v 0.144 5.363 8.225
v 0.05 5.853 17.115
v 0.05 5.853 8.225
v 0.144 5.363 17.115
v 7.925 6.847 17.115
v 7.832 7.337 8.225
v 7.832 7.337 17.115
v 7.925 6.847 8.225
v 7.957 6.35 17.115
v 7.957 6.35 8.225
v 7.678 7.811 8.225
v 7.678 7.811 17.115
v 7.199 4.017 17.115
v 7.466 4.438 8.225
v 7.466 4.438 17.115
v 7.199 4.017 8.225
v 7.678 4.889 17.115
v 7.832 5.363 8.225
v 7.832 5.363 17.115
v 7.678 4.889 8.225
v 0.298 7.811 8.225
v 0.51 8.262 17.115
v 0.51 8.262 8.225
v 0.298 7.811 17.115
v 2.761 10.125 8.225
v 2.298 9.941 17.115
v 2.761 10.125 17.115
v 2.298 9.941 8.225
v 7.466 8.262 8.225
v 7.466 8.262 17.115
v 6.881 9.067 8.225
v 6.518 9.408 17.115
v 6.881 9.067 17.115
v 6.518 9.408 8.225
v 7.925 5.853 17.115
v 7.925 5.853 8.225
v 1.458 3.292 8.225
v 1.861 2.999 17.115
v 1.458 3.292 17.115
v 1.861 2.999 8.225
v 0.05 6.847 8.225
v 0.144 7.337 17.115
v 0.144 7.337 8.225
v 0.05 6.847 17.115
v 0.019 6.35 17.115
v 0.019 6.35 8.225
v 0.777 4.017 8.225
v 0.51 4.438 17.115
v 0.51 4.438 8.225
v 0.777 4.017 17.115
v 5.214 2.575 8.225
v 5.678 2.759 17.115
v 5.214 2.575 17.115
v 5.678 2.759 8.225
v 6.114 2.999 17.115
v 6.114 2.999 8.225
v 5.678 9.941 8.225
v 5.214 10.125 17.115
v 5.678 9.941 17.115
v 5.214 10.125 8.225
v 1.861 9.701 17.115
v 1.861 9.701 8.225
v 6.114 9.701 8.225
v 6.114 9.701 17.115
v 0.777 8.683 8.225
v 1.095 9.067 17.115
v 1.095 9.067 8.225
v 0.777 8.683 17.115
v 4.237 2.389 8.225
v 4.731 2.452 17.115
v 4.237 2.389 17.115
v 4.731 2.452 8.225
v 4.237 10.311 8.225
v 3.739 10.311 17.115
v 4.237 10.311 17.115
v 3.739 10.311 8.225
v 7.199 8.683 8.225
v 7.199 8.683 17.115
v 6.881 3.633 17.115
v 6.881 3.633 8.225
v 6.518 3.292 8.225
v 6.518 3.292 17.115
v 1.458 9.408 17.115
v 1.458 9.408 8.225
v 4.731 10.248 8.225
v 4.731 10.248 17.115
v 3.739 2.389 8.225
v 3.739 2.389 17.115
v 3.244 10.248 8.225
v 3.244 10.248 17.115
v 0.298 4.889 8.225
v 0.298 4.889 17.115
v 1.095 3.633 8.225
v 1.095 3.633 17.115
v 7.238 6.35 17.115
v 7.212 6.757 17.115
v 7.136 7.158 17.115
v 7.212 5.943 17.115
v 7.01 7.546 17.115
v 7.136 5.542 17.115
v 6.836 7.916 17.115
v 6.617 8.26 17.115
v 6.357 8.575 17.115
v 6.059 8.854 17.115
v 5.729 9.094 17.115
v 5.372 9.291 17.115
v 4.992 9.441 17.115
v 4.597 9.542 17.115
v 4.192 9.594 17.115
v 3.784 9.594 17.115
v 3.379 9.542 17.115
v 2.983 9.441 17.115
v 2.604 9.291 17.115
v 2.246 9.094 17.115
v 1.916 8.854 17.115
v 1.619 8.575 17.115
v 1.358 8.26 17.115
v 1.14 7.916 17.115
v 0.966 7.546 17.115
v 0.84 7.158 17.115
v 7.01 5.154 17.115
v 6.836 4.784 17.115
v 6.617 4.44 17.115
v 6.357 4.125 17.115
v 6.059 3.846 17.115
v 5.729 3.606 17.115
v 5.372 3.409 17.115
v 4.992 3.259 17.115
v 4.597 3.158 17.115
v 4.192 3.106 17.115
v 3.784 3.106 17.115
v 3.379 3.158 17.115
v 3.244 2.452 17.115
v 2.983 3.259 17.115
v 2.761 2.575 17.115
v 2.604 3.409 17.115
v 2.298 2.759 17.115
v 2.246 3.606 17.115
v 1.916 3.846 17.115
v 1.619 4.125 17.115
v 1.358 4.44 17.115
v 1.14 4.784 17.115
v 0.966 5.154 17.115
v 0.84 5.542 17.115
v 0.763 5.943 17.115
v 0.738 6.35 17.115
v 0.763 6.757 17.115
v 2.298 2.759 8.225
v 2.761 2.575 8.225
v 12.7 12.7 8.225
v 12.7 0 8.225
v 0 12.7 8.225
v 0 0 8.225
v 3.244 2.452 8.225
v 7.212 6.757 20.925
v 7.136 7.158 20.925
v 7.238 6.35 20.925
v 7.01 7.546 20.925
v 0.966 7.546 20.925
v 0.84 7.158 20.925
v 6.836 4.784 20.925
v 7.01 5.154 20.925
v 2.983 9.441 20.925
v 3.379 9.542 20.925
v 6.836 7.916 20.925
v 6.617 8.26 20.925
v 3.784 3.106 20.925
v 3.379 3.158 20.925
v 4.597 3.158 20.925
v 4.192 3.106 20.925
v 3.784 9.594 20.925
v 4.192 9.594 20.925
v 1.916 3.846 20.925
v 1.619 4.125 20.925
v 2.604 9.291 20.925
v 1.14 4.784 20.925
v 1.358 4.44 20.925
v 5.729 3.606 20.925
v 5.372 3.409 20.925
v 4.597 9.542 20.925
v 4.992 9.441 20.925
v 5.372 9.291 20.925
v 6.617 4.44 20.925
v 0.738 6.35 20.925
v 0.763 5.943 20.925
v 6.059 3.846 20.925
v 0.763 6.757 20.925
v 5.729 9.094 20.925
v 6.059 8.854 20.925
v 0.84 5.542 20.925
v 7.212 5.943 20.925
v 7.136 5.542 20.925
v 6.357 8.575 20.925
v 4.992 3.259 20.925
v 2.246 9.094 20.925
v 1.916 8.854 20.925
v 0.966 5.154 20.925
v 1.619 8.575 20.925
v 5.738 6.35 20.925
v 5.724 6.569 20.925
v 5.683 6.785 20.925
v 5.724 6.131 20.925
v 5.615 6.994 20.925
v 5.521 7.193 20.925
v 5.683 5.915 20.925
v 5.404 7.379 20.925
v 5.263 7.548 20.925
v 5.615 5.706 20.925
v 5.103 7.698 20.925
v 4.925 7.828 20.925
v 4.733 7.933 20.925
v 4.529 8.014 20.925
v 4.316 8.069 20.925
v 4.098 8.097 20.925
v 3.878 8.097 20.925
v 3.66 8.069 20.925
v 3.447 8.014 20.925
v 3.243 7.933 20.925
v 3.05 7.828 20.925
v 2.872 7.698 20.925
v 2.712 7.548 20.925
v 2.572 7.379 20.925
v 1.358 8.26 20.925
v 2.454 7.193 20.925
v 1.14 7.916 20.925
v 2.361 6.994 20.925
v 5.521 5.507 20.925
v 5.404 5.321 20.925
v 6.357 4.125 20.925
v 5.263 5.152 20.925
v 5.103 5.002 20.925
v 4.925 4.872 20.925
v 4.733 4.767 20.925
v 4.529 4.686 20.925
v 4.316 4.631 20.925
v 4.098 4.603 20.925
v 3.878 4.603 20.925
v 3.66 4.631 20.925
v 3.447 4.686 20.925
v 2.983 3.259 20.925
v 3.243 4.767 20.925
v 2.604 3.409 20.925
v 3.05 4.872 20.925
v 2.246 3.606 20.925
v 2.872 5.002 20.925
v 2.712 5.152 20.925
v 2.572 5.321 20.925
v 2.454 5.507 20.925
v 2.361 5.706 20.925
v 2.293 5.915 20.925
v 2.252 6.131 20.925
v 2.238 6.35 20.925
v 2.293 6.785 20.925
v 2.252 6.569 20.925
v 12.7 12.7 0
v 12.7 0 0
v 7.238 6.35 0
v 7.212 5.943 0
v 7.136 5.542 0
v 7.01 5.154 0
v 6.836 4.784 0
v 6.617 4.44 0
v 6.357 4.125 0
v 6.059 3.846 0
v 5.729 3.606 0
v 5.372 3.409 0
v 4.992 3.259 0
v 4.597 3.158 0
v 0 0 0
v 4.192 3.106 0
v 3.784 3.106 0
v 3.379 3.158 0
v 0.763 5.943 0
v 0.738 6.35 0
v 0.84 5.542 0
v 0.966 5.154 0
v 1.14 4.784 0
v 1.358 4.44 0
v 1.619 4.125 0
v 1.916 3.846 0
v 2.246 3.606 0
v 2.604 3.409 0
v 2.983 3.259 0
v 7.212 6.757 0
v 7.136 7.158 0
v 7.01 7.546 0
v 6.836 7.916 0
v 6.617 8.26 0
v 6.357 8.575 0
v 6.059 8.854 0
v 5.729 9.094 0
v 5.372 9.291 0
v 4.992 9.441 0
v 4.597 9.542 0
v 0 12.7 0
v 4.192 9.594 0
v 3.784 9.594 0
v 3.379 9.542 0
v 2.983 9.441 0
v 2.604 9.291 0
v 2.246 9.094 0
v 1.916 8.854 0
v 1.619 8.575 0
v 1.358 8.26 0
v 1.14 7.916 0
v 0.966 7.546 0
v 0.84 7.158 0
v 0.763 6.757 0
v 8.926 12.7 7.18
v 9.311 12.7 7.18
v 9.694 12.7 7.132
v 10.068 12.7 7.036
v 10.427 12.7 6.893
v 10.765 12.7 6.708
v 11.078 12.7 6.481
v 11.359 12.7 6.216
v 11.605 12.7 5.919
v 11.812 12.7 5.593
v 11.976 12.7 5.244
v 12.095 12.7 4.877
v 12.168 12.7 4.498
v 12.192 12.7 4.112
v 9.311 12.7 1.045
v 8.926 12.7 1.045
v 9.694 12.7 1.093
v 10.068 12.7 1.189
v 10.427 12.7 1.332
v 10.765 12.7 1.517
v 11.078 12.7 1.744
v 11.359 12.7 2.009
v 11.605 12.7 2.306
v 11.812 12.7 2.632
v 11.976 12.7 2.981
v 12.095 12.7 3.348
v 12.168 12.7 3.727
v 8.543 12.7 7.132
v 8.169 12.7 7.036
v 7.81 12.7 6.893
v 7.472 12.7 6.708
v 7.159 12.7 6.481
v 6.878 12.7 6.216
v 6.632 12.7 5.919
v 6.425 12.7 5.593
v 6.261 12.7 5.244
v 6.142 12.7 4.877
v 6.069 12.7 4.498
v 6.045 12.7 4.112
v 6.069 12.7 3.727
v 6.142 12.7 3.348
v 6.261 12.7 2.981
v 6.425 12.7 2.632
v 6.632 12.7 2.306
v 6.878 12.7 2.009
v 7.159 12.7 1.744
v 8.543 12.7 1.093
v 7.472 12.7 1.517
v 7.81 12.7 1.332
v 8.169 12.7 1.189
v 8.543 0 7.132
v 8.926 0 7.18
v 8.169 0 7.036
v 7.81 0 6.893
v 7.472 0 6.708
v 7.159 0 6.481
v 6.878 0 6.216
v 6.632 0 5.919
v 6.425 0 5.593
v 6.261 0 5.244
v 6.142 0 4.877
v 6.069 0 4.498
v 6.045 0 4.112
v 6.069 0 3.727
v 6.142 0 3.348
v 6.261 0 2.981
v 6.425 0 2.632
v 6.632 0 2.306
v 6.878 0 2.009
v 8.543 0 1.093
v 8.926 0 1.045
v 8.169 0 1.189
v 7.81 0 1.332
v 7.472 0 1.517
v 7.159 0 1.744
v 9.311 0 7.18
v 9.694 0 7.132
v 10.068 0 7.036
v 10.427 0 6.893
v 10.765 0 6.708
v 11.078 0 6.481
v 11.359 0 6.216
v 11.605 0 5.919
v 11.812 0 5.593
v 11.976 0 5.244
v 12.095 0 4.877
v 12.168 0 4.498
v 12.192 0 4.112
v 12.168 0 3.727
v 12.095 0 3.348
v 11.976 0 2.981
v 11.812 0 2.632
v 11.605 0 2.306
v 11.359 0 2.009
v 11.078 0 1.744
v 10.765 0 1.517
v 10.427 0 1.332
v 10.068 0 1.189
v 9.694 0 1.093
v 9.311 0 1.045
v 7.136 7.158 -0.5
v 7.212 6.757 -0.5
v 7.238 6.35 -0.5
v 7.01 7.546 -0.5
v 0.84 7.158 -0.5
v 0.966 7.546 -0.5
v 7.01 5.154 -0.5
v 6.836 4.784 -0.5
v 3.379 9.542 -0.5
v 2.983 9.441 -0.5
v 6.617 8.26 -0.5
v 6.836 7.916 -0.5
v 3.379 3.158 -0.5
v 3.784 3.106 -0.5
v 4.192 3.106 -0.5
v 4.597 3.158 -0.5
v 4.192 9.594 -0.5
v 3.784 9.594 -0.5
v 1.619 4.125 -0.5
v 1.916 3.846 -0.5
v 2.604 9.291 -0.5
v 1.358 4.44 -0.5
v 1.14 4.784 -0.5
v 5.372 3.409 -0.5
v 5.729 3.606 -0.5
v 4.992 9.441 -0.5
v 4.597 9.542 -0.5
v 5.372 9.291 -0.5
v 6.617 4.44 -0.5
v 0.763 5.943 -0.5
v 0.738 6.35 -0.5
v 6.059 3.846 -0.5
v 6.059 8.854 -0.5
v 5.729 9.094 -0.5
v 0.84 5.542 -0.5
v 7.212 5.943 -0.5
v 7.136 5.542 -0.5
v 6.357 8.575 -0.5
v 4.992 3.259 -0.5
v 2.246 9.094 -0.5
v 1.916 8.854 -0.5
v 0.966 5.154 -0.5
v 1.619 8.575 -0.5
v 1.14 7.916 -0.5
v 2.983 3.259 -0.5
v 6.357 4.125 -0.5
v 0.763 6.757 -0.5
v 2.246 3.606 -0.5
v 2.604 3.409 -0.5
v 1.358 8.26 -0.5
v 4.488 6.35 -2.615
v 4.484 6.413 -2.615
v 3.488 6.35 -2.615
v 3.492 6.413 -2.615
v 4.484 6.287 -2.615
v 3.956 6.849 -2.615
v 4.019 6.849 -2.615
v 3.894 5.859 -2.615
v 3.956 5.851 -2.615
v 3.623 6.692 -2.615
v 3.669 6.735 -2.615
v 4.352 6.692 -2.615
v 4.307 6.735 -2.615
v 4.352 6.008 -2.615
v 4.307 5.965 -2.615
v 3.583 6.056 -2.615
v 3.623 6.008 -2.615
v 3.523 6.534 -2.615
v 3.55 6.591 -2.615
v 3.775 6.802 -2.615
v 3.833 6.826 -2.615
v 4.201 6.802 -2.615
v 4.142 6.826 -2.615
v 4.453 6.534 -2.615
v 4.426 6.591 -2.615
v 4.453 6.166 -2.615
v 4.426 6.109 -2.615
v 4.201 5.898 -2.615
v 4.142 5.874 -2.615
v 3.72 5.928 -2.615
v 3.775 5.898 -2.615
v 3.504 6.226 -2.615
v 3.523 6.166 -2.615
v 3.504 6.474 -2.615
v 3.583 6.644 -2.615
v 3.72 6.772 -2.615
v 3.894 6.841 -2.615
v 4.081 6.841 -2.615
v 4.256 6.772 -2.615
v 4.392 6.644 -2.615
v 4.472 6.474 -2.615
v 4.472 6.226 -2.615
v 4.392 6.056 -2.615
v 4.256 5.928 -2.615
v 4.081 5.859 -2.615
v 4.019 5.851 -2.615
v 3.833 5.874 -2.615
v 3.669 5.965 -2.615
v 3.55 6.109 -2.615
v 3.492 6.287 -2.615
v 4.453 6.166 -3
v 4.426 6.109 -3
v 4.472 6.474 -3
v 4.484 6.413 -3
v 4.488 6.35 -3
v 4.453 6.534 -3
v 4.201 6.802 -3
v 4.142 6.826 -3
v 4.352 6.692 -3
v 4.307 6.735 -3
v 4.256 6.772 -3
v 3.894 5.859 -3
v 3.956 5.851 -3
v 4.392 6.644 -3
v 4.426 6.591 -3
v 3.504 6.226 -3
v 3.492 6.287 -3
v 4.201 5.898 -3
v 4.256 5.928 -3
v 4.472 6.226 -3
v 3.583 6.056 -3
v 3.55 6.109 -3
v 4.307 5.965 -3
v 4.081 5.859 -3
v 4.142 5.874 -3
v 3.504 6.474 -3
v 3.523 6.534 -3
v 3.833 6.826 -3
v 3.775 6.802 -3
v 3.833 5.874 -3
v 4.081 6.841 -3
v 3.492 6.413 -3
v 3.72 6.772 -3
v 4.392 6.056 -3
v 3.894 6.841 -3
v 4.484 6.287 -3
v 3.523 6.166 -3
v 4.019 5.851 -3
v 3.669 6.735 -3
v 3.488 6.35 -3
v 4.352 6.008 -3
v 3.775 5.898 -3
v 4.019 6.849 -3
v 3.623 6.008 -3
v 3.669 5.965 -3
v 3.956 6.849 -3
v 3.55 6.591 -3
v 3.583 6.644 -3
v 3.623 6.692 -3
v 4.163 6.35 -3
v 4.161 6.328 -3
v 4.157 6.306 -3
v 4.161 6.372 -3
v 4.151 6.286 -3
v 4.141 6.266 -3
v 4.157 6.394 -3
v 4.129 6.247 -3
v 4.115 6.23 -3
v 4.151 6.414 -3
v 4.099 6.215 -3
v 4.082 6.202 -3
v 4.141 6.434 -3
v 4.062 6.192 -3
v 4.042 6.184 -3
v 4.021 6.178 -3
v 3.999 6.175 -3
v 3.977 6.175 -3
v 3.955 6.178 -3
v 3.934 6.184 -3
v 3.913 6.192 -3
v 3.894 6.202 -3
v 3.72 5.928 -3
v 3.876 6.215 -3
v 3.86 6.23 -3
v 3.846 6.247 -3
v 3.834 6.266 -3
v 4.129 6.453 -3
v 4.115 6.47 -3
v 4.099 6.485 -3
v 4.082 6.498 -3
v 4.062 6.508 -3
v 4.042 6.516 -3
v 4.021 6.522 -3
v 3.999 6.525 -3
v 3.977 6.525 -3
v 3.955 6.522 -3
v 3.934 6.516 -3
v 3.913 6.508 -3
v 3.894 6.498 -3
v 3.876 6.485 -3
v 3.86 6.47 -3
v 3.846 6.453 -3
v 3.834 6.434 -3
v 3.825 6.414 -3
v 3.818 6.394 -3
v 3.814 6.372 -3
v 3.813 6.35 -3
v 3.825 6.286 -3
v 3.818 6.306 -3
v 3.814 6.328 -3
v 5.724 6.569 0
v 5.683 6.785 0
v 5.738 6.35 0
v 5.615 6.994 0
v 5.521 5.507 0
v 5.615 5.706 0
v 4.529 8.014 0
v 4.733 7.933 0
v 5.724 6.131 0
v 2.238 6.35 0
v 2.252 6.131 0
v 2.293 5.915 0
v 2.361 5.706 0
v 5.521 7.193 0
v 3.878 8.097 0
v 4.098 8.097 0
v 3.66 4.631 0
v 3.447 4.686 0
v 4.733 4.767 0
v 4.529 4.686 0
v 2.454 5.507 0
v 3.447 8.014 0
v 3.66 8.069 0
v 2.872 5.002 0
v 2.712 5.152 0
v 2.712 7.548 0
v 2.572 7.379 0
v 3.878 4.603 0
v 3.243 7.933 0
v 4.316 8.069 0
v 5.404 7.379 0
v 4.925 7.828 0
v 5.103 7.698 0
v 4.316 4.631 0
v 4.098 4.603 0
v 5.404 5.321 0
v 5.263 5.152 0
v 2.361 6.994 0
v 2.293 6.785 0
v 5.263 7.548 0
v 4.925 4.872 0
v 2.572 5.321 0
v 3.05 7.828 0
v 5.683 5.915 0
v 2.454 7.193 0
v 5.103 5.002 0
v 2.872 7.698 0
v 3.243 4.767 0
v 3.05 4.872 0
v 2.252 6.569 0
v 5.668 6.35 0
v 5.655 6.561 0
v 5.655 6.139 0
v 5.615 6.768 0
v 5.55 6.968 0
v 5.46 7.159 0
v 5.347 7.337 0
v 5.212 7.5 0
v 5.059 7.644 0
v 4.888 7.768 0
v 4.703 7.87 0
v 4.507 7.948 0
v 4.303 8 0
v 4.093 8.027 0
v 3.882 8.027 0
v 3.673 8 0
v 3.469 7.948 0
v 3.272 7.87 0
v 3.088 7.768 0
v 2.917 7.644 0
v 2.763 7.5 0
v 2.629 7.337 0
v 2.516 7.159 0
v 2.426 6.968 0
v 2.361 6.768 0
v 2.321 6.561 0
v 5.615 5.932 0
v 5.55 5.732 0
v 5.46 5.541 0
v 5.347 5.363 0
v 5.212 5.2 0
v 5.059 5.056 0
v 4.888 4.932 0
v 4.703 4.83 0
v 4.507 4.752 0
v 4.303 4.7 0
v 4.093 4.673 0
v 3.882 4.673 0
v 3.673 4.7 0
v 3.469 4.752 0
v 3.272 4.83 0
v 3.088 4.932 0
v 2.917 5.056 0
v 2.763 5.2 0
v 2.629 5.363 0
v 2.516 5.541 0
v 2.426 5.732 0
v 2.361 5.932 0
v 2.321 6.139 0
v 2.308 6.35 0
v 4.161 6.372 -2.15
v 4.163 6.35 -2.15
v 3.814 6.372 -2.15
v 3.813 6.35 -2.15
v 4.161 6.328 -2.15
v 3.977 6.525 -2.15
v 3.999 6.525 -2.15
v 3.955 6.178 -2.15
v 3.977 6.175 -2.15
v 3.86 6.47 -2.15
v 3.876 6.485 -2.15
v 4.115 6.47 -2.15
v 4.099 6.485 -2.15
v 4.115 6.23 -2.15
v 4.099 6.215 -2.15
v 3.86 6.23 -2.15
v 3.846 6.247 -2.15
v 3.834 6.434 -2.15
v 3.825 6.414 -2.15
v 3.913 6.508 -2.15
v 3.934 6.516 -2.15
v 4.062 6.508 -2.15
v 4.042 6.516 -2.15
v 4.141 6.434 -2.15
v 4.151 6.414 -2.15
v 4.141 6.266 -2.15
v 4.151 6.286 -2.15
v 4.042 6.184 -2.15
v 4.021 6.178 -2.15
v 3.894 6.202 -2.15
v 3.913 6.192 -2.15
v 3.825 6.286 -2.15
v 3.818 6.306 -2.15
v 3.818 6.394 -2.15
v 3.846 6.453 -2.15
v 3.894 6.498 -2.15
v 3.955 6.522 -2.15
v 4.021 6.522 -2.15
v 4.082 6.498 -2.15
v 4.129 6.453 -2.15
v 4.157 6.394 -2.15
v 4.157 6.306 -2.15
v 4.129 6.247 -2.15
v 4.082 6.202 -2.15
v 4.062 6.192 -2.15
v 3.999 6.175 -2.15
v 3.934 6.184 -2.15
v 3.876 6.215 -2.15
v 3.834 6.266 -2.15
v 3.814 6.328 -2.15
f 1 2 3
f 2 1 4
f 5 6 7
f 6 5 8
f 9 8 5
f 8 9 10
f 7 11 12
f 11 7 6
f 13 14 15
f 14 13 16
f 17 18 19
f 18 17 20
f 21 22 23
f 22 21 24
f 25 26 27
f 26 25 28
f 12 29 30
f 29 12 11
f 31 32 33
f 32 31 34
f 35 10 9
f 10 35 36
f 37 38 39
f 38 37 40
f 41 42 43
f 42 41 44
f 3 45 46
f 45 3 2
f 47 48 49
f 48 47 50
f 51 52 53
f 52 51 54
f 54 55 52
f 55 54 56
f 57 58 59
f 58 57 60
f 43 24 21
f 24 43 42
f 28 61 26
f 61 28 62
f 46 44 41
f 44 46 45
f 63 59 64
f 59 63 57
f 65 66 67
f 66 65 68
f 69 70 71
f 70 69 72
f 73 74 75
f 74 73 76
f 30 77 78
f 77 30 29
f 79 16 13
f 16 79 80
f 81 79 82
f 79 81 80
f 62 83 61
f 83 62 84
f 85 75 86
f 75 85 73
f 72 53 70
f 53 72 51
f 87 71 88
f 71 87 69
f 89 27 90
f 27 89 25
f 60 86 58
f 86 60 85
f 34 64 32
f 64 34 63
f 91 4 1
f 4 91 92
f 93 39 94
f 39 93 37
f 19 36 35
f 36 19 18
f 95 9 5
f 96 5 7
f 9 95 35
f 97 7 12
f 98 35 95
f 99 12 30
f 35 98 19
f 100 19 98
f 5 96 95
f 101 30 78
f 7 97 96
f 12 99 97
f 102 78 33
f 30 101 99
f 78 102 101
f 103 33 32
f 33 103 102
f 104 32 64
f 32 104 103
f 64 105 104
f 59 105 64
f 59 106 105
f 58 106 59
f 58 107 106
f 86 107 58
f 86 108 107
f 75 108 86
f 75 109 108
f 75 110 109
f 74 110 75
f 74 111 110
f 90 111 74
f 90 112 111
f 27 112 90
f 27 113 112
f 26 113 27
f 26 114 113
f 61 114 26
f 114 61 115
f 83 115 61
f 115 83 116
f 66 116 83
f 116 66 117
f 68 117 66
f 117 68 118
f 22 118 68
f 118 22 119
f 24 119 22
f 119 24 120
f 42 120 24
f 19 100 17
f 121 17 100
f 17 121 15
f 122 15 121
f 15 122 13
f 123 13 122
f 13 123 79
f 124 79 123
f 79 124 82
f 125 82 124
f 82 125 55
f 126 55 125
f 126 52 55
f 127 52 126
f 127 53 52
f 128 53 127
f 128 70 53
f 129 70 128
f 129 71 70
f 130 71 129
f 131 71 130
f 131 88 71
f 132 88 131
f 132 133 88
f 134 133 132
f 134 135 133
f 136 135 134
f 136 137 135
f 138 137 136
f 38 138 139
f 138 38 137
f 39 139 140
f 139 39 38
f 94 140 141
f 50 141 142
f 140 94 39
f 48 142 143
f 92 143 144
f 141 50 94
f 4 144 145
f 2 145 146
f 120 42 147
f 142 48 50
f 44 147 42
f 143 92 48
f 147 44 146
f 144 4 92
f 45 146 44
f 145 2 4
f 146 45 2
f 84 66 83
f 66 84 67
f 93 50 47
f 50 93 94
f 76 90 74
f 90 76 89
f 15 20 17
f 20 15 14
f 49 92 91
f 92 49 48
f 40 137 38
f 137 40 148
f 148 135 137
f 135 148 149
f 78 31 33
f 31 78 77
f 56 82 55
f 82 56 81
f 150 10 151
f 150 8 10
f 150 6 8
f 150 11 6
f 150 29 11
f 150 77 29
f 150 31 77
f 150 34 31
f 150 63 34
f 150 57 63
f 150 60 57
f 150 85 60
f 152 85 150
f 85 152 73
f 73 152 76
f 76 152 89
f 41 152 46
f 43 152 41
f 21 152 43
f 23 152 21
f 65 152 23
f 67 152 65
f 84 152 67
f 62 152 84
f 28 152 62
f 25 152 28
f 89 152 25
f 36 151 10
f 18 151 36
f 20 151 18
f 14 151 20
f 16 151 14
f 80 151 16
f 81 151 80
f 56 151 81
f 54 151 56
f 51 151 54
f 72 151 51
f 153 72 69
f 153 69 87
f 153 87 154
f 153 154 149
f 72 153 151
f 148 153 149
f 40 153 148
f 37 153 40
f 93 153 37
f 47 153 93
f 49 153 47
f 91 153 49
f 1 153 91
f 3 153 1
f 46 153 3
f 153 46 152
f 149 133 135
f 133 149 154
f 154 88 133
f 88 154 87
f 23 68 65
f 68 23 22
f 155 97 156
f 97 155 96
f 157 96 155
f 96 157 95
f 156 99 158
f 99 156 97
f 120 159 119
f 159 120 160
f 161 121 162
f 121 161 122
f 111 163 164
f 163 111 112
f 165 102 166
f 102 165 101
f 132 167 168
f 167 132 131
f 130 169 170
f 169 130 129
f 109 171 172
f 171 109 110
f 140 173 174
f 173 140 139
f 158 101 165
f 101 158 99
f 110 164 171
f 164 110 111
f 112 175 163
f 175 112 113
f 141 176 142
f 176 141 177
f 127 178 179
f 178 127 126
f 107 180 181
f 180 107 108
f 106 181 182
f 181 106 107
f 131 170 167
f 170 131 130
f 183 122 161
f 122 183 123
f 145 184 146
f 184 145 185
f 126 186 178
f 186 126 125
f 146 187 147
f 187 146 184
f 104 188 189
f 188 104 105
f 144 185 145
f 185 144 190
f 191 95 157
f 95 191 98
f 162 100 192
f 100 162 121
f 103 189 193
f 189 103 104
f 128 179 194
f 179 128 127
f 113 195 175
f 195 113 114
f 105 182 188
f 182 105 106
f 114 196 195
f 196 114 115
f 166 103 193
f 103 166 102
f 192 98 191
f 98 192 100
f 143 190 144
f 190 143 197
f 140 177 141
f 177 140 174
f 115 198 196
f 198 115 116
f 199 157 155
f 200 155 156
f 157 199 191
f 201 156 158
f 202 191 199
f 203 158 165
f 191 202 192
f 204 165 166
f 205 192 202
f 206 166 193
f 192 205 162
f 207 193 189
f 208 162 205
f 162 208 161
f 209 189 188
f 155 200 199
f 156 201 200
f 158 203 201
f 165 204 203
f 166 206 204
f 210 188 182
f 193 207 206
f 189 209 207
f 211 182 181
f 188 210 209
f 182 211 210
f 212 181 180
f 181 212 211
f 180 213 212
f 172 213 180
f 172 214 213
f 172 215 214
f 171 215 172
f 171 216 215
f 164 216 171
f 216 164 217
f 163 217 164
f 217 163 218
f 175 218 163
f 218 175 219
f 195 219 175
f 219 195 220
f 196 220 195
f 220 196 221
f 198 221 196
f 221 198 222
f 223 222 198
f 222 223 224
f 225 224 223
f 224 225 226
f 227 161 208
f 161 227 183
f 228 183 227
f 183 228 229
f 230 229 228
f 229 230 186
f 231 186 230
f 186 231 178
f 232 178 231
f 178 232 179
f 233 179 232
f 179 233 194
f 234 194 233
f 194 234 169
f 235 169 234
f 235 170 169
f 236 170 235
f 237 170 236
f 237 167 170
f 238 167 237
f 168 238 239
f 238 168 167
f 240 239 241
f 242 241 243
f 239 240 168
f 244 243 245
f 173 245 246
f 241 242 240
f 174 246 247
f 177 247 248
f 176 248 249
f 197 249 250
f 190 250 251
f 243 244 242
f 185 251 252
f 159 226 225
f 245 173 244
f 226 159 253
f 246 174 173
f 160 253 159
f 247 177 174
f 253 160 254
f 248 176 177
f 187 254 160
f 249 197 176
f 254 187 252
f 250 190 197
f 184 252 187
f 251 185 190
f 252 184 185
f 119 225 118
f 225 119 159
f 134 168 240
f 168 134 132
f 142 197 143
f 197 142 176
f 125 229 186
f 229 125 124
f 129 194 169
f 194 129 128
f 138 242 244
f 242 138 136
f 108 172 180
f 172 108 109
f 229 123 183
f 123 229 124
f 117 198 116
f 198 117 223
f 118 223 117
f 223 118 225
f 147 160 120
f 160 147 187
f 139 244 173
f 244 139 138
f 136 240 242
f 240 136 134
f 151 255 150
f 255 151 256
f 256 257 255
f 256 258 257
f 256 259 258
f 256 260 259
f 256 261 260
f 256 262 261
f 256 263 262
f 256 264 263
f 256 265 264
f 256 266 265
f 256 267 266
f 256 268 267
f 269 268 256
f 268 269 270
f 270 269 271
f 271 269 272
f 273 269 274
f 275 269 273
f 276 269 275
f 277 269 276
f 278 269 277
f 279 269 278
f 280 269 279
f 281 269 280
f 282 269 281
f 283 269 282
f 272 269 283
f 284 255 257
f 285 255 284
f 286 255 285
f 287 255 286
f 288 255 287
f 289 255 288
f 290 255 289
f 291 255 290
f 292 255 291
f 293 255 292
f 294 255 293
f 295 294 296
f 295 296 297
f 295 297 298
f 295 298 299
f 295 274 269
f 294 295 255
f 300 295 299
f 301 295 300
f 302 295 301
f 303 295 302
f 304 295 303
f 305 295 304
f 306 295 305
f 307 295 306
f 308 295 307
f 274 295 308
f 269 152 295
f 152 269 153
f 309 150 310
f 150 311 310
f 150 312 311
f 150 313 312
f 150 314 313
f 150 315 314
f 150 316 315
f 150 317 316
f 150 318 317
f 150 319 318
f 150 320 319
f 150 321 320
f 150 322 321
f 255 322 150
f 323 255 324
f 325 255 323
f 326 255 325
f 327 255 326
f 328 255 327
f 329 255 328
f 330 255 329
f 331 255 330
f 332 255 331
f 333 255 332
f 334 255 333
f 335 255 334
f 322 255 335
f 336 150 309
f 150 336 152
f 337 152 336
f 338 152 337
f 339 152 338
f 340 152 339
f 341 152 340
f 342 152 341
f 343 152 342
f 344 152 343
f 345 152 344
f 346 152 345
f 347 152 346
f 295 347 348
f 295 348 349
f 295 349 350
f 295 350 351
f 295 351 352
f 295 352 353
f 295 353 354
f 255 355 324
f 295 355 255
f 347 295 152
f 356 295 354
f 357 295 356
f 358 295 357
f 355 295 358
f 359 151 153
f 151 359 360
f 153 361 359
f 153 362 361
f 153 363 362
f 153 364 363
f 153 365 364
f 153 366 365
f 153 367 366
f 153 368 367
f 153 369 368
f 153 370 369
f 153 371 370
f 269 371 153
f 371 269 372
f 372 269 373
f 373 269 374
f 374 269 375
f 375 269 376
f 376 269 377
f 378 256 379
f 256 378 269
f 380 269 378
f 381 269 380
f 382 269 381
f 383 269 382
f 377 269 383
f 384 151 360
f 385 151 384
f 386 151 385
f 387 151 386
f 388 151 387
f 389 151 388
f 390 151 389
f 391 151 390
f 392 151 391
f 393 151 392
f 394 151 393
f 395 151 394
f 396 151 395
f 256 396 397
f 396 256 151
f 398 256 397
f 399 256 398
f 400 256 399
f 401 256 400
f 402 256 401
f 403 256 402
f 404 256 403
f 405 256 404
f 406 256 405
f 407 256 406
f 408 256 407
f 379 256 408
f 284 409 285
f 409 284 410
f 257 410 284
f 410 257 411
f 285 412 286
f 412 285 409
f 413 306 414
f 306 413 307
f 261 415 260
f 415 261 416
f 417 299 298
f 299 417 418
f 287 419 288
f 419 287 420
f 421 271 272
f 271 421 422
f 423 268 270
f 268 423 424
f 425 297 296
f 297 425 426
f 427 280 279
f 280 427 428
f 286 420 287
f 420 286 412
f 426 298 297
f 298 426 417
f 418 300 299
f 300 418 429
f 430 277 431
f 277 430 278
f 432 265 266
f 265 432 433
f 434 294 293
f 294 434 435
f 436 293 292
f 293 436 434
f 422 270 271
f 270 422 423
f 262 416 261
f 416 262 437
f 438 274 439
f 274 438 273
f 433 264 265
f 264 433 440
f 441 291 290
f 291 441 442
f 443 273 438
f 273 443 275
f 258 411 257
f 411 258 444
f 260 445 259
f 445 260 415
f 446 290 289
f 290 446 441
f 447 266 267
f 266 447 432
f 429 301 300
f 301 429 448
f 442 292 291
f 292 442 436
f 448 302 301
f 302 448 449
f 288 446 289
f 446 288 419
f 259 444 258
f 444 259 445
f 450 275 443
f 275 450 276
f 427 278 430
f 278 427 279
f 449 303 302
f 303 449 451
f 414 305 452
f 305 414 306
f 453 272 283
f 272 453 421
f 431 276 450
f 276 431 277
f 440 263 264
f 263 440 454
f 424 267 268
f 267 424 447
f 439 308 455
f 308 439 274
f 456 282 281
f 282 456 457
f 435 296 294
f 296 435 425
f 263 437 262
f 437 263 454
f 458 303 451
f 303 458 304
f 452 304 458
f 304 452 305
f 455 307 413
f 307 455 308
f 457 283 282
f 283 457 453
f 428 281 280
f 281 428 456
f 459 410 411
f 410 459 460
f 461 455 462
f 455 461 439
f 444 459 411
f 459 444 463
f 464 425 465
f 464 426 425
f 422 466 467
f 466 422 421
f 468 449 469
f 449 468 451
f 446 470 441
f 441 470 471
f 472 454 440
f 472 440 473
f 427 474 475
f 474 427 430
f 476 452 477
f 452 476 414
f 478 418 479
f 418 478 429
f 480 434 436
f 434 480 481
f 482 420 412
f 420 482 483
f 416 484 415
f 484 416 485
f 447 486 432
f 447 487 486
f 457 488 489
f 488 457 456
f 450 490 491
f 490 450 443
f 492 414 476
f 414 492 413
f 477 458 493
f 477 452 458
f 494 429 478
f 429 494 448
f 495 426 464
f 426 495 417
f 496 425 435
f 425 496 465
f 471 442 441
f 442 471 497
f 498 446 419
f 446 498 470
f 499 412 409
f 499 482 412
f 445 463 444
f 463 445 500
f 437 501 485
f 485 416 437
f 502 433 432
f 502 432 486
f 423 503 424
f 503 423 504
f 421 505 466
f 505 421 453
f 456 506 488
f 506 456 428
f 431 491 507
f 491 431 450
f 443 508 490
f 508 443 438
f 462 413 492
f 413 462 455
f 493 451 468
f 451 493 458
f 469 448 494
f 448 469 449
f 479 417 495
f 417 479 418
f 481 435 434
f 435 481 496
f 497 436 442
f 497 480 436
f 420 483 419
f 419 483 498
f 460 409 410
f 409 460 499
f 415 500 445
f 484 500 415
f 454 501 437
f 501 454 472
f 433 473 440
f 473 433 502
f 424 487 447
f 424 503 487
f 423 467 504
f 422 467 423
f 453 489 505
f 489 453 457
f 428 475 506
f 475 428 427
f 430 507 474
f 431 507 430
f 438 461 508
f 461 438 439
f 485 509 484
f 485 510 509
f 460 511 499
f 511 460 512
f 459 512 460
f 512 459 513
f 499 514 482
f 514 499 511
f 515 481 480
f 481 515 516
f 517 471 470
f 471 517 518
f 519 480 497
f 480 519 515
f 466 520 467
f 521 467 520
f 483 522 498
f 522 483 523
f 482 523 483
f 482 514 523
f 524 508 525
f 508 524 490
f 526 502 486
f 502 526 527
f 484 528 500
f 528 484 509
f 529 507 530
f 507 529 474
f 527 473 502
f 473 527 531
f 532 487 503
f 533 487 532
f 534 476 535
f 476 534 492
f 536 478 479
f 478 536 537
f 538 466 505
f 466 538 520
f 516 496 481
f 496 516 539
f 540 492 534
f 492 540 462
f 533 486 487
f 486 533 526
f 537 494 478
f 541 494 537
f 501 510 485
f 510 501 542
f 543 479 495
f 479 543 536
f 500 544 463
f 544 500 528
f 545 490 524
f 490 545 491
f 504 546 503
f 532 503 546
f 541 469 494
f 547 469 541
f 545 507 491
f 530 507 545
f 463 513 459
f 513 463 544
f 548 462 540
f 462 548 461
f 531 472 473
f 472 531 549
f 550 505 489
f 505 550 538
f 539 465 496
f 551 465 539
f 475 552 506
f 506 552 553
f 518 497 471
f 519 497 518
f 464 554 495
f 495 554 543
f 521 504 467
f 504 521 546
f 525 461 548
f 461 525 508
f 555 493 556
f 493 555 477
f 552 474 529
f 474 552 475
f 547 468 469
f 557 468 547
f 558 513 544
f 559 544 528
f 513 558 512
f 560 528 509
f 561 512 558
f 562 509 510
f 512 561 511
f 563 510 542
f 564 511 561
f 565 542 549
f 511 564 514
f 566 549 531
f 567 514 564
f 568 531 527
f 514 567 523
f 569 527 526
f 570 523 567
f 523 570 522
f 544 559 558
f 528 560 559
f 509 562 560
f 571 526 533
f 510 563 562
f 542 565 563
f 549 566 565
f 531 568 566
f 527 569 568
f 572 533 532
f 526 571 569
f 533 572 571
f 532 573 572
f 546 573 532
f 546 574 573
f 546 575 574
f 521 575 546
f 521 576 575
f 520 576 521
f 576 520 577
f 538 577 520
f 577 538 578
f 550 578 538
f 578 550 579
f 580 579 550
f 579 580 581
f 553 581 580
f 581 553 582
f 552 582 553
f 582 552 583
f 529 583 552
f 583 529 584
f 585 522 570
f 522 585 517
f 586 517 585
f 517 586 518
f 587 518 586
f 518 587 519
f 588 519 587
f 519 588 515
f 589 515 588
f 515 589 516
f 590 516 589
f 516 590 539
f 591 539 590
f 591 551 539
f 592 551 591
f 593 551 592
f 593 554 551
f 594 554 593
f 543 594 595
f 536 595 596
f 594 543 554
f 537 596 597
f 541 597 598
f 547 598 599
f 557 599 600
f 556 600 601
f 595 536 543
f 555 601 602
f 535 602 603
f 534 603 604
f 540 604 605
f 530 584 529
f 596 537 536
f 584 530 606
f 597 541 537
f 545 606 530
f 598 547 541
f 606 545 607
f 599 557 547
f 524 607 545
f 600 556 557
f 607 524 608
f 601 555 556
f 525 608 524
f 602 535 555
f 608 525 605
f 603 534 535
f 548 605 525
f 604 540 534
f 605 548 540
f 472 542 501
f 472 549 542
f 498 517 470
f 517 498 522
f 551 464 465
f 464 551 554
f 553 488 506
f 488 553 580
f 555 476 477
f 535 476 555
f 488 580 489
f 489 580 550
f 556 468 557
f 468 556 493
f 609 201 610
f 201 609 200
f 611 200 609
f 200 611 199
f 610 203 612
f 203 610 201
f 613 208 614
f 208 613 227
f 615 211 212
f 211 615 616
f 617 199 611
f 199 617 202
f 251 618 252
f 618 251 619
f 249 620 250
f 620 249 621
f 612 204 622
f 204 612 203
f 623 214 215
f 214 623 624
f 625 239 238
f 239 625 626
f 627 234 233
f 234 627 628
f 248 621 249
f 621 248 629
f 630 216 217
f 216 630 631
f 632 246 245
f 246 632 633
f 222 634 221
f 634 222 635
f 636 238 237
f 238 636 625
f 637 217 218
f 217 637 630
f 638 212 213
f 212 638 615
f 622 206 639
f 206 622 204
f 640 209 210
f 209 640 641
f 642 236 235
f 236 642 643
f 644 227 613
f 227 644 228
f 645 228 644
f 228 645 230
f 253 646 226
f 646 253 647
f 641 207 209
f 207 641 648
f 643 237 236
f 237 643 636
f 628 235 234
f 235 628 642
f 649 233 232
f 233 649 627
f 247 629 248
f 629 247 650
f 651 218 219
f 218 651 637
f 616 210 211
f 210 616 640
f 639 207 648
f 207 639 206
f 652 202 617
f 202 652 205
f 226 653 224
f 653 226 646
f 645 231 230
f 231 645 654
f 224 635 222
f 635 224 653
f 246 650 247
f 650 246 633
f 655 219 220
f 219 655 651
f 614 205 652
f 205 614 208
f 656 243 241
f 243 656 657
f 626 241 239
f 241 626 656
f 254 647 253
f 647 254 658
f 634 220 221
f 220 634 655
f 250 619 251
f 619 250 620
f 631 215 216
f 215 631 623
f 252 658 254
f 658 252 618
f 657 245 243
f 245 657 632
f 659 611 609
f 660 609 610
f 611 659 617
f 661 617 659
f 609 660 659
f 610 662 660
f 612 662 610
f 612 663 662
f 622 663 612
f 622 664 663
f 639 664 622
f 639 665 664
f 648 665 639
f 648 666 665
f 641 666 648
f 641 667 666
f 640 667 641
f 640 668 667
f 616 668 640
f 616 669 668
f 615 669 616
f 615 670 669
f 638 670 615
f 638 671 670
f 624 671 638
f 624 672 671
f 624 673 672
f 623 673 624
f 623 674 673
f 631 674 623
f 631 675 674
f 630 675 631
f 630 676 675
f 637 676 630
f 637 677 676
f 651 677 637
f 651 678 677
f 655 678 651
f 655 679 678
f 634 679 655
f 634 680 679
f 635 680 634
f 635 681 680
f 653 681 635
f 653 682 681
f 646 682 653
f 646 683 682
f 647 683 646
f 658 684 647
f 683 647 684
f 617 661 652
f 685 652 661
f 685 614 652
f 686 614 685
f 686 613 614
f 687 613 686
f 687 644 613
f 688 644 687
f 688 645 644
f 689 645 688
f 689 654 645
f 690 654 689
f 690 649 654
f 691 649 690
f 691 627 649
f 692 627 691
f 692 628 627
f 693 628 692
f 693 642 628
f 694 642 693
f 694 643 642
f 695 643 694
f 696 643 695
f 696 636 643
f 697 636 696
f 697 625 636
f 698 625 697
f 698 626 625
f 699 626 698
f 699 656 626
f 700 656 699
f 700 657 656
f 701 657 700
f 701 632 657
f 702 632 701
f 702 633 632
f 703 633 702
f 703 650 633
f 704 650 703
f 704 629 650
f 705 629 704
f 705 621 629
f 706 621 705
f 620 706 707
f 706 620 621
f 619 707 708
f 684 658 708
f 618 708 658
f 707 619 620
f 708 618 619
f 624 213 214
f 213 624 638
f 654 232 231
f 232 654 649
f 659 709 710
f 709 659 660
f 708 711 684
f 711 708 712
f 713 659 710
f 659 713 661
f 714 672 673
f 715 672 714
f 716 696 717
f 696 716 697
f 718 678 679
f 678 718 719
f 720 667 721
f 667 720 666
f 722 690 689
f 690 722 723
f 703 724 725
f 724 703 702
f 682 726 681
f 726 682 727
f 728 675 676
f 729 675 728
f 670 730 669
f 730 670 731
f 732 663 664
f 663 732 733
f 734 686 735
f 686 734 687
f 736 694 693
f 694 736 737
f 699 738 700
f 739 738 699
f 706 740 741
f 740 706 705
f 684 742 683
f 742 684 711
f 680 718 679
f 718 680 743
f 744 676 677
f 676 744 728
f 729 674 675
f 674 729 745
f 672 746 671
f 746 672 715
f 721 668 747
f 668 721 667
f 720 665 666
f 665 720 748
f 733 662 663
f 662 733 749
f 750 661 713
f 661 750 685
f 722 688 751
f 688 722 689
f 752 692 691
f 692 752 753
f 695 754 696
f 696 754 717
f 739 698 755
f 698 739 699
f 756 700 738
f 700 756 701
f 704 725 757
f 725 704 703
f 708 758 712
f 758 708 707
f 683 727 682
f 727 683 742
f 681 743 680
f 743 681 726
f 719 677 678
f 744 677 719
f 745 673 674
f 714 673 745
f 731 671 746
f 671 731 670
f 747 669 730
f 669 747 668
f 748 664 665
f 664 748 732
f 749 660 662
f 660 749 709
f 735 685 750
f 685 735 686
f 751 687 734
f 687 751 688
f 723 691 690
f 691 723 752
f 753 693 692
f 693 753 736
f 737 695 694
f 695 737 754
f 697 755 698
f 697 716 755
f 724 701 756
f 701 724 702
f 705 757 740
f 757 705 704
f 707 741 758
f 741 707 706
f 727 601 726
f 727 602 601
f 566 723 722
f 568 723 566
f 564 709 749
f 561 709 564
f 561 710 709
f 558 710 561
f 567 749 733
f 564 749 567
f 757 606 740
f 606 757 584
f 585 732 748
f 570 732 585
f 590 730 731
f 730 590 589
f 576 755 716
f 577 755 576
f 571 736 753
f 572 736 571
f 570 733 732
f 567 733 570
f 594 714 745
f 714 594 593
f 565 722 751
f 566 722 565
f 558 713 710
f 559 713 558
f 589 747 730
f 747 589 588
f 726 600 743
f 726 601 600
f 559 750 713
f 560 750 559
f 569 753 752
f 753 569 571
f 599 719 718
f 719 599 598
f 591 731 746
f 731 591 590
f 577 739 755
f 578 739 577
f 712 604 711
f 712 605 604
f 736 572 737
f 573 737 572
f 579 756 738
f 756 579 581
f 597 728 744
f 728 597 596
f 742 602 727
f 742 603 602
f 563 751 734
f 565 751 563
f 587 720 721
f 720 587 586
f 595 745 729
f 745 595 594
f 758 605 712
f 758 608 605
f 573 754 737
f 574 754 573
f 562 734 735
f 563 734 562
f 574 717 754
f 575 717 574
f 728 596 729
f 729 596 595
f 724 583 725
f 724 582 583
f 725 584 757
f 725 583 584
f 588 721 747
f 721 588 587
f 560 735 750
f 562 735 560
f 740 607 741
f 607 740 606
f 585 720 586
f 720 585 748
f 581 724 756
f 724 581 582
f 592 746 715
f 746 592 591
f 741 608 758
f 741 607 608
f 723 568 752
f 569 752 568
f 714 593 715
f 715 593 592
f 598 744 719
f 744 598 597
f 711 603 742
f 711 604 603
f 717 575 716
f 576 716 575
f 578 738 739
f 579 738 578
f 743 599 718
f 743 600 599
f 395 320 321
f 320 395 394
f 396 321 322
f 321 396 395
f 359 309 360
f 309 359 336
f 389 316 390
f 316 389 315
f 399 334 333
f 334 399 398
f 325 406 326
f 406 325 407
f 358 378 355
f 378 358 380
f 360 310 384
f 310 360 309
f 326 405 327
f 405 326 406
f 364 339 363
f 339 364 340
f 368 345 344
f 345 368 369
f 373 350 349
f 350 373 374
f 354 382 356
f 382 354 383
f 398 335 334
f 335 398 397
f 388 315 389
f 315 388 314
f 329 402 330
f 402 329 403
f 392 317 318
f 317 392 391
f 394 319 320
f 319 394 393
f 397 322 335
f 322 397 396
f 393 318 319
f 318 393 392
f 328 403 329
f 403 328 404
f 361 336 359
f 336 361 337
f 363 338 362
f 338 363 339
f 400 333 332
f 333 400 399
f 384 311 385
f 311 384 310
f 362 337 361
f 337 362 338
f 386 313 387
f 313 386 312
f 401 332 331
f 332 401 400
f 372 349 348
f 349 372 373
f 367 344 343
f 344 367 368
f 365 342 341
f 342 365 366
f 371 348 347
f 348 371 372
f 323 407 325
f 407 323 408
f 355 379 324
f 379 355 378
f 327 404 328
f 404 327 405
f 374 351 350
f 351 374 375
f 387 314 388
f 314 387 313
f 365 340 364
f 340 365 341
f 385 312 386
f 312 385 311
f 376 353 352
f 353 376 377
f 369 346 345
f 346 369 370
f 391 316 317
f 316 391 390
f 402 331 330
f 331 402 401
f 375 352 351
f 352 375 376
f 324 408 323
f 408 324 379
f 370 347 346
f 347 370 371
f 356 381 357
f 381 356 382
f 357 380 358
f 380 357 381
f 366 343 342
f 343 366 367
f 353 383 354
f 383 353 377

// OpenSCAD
/* model of a jhead taken from http://reprap.org/wiki/J_Head_Nozzle#Version_6


* Material: Brass Bar Stock, 1/2" Square, 1.000" Long
Finished Weight: ~11.3 grams (will need verified)
* On the brass bar stock, find the center of the axis of the nozzle. 
(The axis is centered at 0.250 +-0.001, from one edge, 
and 0.157 -0.000 +0.003 from an adjacent edge.) 
* Turn the threaded end of the nozzle down to 0.3125 +0.000 -0.004.
This section is 0.500 +-0.005 long.
* For the first 0.150 +-0.010, of the threaded section, down to an 
OD of 0.255 (6.5mm) +0.000 -0.002.
* Thread the nozzle to 5/16-24 up to the shoulder of the heater section.
* Drill out the center of the nozzle with a 3.5mm drill bit. 
This will create a heat chamber that is the entire length of the brass nozzle.
* Machine the nozzle tip to the desired profile leaving the heater 
block section 0.325 thick.
* Drill the nozzle orifice.
* Using a size C drill bit, drill the heater resistor hole through the 
heater block section. The remaining brass, between this hole and the 
edge opposite of the melt chamber, should be 0.020 +-0.002 thick.
* 
* 
* 
*/

$fn=50;

heater_width = 12.7;
heater_length = 12.7;
heater_height = 8.225;
heater_hole_radius = 6.147/2;

nozzle_centre_y = 6.35;
nozzle_centre_x = 3.9878;

nozzle_thread_length = 12.7;
nozzle_thread_dia = 7.9375;
nozzle_thread_radius = nozzle_thread_dia/2;

nozzle_thread_start_length = 3.81;
nozzle_thread_start_dia = 6.5;

nozzle_base_height = 0.5;
nozzle_cone_height = 2.5;

heater_hole_wall_gap = 0.508;

module jhead_body()
{
	
}

module jhead_nozzle()
{	
	difference()
	{
		union()
		{
			difference()
			{
				union()
				{
					//threaded cylinder
					translate([nozzle_centre_x,nozzle_centre_y,heater_height])
					{
						cylinder(r=nozzle_thread_dia/2,h=nozzle_thread_length-nozzle_thread_start_length);
					}
					
					//top of threaded cylinder
					translate([nozzle_centre_x,nozzle_centre_y,heater_height+nozzle_thread_length-nozzle_thread_start_length])
					{
						cylinder(r=nozzle_thread_start_dia/2,h=nozzle_thread_start_length);
					}
					
					//heater block
					cube([heater_width, heater_length, heater_height]);

					//extended bit of nozzle head
					translate([nozzle_centre_x,nozzle_centre_y,-nozzle_base_height])
					{
						cylinder(r=nozzle_thread_start_dia/2,h=nozzle_base_height);
					}
					
					//nozzle cone
					translate([nozzle_centre_x,nozzle_centre_y,-nozzle_cone_height-nozzle_base_height])
					{
						cylinder(r1=0,r2=nozzle_thread_start_dia/2,h=nozzle_cone_height);
					}
					
					//sticky out bit at end of nozzle
					translate([nozzle_centre_x,nozzle_centre_y,-nozzle_cone_height-nozzle_base_height])
					{
						cylinder(r=0.5,h=1);
					}
				}
				
				union()
				{
					translate([nozzle_centre_x,nozzle_centre_y,0])
					{
						cylinder(r=3.5/2, h=heater_height+nozzle_thread_length+nozzle_thread_start_length+10);
						translate([0,0,-nozzle_cone_height+0.1])
						{
							cylinder(r1=0,r2=3.5/2,h=nozzle_cone_height);
						}
					}
				}
			}
		}
		
		translate([nozzle_centre_x,nozzle_centre_y,-20])
		{
			cylinder(r = 0.35/2, h = 200);
		}
		
		translate([heater_width-heater_hole_radius-heater_hole_wall_gap,15,heater_height/2])
		{
			rotate([90,0,0])
			{
				cylinder(r = heater_hole_radius, h = 20);
			}
		}
		
		/*/ expose cross section
		translate([-50,7,-12])
		{
			cube([100,100,100]);
		}*/
		
	}
	
}

jhead_nozzle();
